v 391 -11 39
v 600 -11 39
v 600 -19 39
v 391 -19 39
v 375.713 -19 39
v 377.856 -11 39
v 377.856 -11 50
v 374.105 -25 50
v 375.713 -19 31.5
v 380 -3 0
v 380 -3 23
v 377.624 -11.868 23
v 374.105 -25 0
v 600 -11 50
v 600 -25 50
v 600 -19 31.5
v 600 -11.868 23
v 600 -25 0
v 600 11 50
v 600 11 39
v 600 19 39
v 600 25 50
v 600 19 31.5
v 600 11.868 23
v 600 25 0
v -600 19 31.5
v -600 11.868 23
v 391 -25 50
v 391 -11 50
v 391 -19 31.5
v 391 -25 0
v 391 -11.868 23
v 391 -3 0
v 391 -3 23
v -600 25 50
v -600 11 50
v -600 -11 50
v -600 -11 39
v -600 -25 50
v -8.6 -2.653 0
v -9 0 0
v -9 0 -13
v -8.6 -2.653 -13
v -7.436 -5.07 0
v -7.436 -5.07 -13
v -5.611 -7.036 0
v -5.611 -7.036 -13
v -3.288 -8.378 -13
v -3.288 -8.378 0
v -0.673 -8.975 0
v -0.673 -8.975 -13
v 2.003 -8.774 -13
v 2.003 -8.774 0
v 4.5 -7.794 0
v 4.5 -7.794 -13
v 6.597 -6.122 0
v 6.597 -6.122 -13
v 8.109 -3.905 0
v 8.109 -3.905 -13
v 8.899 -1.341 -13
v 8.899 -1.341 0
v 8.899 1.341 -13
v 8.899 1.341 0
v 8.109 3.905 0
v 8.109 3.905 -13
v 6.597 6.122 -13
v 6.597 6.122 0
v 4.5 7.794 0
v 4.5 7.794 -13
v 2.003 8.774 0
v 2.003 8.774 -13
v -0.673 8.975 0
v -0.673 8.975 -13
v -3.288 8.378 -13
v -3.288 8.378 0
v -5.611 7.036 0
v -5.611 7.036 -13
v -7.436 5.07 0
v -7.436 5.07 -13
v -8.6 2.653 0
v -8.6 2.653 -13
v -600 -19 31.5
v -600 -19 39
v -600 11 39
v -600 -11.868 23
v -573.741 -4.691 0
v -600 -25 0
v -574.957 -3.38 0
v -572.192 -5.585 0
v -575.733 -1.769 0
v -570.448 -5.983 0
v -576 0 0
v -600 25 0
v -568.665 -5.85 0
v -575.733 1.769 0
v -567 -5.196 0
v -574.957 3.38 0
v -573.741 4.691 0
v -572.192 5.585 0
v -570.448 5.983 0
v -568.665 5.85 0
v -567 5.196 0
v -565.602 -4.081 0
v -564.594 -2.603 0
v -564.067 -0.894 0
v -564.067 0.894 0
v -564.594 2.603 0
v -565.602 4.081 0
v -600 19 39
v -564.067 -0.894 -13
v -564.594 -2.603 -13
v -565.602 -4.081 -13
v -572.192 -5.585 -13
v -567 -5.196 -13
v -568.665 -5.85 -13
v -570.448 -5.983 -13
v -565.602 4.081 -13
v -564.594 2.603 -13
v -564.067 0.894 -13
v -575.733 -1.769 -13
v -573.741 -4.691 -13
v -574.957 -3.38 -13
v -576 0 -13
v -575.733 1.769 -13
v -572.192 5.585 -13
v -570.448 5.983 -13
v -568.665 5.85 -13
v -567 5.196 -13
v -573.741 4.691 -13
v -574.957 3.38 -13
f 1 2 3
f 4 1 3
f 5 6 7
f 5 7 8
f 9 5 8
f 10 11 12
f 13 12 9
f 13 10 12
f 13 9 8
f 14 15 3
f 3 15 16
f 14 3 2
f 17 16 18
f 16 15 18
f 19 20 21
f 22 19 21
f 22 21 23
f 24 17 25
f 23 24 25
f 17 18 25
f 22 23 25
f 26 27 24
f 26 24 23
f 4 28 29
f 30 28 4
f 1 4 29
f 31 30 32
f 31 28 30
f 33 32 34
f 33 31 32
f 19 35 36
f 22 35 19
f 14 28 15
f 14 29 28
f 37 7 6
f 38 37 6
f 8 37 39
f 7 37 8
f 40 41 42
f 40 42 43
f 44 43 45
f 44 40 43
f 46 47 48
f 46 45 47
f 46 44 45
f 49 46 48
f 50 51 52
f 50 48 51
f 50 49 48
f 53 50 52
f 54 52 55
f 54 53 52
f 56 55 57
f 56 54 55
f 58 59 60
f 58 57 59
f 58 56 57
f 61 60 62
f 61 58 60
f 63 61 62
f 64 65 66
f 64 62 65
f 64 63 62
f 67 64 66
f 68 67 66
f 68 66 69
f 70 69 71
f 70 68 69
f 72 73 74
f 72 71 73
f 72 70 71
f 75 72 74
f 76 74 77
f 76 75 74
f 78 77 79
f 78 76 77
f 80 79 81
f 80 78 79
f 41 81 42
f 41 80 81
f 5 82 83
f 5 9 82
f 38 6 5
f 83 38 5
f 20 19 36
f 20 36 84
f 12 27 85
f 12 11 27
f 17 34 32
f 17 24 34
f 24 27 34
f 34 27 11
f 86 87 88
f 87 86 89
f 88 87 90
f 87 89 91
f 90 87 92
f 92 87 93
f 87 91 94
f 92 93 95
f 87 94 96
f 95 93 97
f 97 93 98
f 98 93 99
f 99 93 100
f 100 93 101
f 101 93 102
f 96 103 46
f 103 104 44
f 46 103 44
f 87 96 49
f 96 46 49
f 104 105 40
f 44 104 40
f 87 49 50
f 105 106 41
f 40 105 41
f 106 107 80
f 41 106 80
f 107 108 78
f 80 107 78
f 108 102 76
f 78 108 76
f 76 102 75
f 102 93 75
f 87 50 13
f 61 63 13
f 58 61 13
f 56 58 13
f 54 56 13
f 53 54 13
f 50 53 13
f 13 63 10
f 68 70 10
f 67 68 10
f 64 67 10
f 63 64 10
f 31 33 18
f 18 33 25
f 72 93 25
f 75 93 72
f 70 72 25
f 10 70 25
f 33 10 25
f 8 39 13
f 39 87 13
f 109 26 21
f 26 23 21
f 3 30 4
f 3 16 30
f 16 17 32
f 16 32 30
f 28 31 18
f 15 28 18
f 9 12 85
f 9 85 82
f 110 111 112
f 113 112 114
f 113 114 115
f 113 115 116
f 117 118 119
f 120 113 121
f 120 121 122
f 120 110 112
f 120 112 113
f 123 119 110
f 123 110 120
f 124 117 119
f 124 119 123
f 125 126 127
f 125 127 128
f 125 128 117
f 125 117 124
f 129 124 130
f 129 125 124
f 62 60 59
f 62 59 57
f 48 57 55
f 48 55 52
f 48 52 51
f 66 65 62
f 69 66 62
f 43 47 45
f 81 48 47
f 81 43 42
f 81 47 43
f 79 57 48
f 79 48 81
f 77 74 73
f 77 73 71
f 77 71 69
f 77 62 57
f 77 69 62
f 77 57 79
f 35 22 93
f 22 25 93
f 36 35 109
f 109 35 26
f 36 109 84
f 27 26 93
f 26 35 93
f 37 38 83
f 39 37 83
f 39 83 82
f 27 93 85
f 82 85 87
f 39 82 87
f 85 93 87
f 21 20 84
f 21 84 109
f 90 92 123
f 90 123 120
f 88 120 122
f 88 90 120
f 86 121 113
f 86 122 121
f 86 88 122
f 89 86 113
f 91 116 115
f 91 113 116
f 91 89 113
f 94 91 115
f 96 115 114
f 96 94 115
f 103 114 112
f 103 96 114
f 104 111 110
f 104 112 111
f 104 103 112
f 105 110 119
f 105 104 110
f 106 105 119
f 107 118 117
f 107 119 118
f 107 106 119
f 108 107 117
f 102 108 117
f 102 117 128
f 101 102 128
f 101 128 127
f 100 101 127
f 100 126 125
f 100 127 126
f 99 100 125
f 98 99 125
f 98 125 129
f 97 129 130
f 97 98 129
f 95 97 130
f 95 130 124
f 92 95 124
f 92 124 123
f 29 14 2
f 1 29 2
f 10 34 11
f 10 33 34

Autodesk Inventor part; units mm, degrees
ref_plane "YZ Plane" through (0, 0, 0) normal (1, 0, 0) x (0, 1, 0)
ref_plane "XZ Plane" through (0, 0, 0) normal (0, 1, 0) x (-1, 0, 0)
ref_plane "XY Plane" through (0, 0, 0) normal (0, 0, 1) x (1, 0, 0)
sketch "Sketch1" plane through (0, 0, 0) normal (0, 0, 1) x (1, 0, 0)
  line L0 (-600, -25) -> (600, -25)
  line L1 (600, -25) -> (600, 25)
  line L2 (600, 25) -> (-600, 25)
  line L3 (-600, 25) -> (-600, -25)
  line L4 (-600, -25) -> (600, 25) construction
  line L5 (600, -25) -> (-600, 25) construction
  point P0 (0, 0)
  dimension "d0" = 1200
  dimension "d1" = 50
extrude "Extrusion1" add sketch "Sketch1" along normal blind 50
sketch "Sketch2" plane through (0, 0, 0) normal (0, 0, -1) x (-1, 0, 0)
  circle A0 centre (0, 0) radius 9
  circle A1 centre (570, 0) radius 6
  line L0 (600, 25) -> (600, -25) projected
  line L1 (-600, 25) -> (600, 25) projected
  dimension "d13" = 18
  dimension "d20" = 30
  dimension "d21" = 12
  dimension "d22" = 50
  dimension "d23" = 25
extrude "Extrusion2" add sketch "Sketch2" along normal blind 13
sketch "Sketch5" plane through (0, 0, 0) normal (0, 0, -1) x (-1, 0, 0)
  line L0 (600, -25) -> (-600, -25) projected
  line L1 (-391, -25) -> (-391, -3)
  line L2 (-391, -3) -> (-380, -3)
  line L3 (-380, -3) -> (-380, -25) construction
  line L4 (-380, -3) -> (-374.1051, -25)
  point P0 (0, 0)
  dimension "d30" = 15
  dimension "d31" = 22
  dimension "d32" = 11
  dimension "d33" = 209
extrude "Extrusion4" cut sketch "Sketch5" against normal through all
sketch "Sketch6" plane through (600, -25, 0) normal (1, 0, 0) x (0, 0, -1)
  line L0 (-50, 0) -> (-50, 50) projected
  line L1 (0, 50) -> (-50, 50) projected
  line L2 (0, 0) -> (0, 50) projected
  line L3 (0, 50) -> (-50, 50) projected
  line L4 (-50, 0) -> (-50, 50) projected
  line L5 (0, 0) -> (-50, 0) projected
  line L6 (-50, 36) -> (-39, 36)
  line L7 (-39, 36) -> (-39, 44)
  line L8 (-50, 14) -> (-39, 14)
  line L9 (-39, 14) -> (-39, 6)
  line L10 (-23, 36.8677) -> (-23, 13.1323)
  line L11 (-23, 36.8677) -> (-31.5, 44)
  line L12 (-31.5, 44) -> (-39, 44)
  line L13 (-23, 13.1323) -> (-31.5, 6)
  line L14 (-31.5, 6) -> (-39, 6)
  point P0 (0, 25)
  dimension "d36" = 14
  dimension "d37" = 14
  dimension "d38" = 8
  dimension "d42" = 16
  dimension "d43" = 11
  dimension "d44" = 7.5
  dimension "d88" = 140
  dimension "d89" = 140
extrude "Extrusion5" cut sketch "Sketch6" against normal through all contours L0 L6 L7 L12 L11 L10 L13 L14 L9 L8
equation "\"d23\" = 0.5 * d22"
equation "\"d37\" = d36"
equation "\"d89\" = d88"
properties part number "u_lange_Stange" material "Birch"
